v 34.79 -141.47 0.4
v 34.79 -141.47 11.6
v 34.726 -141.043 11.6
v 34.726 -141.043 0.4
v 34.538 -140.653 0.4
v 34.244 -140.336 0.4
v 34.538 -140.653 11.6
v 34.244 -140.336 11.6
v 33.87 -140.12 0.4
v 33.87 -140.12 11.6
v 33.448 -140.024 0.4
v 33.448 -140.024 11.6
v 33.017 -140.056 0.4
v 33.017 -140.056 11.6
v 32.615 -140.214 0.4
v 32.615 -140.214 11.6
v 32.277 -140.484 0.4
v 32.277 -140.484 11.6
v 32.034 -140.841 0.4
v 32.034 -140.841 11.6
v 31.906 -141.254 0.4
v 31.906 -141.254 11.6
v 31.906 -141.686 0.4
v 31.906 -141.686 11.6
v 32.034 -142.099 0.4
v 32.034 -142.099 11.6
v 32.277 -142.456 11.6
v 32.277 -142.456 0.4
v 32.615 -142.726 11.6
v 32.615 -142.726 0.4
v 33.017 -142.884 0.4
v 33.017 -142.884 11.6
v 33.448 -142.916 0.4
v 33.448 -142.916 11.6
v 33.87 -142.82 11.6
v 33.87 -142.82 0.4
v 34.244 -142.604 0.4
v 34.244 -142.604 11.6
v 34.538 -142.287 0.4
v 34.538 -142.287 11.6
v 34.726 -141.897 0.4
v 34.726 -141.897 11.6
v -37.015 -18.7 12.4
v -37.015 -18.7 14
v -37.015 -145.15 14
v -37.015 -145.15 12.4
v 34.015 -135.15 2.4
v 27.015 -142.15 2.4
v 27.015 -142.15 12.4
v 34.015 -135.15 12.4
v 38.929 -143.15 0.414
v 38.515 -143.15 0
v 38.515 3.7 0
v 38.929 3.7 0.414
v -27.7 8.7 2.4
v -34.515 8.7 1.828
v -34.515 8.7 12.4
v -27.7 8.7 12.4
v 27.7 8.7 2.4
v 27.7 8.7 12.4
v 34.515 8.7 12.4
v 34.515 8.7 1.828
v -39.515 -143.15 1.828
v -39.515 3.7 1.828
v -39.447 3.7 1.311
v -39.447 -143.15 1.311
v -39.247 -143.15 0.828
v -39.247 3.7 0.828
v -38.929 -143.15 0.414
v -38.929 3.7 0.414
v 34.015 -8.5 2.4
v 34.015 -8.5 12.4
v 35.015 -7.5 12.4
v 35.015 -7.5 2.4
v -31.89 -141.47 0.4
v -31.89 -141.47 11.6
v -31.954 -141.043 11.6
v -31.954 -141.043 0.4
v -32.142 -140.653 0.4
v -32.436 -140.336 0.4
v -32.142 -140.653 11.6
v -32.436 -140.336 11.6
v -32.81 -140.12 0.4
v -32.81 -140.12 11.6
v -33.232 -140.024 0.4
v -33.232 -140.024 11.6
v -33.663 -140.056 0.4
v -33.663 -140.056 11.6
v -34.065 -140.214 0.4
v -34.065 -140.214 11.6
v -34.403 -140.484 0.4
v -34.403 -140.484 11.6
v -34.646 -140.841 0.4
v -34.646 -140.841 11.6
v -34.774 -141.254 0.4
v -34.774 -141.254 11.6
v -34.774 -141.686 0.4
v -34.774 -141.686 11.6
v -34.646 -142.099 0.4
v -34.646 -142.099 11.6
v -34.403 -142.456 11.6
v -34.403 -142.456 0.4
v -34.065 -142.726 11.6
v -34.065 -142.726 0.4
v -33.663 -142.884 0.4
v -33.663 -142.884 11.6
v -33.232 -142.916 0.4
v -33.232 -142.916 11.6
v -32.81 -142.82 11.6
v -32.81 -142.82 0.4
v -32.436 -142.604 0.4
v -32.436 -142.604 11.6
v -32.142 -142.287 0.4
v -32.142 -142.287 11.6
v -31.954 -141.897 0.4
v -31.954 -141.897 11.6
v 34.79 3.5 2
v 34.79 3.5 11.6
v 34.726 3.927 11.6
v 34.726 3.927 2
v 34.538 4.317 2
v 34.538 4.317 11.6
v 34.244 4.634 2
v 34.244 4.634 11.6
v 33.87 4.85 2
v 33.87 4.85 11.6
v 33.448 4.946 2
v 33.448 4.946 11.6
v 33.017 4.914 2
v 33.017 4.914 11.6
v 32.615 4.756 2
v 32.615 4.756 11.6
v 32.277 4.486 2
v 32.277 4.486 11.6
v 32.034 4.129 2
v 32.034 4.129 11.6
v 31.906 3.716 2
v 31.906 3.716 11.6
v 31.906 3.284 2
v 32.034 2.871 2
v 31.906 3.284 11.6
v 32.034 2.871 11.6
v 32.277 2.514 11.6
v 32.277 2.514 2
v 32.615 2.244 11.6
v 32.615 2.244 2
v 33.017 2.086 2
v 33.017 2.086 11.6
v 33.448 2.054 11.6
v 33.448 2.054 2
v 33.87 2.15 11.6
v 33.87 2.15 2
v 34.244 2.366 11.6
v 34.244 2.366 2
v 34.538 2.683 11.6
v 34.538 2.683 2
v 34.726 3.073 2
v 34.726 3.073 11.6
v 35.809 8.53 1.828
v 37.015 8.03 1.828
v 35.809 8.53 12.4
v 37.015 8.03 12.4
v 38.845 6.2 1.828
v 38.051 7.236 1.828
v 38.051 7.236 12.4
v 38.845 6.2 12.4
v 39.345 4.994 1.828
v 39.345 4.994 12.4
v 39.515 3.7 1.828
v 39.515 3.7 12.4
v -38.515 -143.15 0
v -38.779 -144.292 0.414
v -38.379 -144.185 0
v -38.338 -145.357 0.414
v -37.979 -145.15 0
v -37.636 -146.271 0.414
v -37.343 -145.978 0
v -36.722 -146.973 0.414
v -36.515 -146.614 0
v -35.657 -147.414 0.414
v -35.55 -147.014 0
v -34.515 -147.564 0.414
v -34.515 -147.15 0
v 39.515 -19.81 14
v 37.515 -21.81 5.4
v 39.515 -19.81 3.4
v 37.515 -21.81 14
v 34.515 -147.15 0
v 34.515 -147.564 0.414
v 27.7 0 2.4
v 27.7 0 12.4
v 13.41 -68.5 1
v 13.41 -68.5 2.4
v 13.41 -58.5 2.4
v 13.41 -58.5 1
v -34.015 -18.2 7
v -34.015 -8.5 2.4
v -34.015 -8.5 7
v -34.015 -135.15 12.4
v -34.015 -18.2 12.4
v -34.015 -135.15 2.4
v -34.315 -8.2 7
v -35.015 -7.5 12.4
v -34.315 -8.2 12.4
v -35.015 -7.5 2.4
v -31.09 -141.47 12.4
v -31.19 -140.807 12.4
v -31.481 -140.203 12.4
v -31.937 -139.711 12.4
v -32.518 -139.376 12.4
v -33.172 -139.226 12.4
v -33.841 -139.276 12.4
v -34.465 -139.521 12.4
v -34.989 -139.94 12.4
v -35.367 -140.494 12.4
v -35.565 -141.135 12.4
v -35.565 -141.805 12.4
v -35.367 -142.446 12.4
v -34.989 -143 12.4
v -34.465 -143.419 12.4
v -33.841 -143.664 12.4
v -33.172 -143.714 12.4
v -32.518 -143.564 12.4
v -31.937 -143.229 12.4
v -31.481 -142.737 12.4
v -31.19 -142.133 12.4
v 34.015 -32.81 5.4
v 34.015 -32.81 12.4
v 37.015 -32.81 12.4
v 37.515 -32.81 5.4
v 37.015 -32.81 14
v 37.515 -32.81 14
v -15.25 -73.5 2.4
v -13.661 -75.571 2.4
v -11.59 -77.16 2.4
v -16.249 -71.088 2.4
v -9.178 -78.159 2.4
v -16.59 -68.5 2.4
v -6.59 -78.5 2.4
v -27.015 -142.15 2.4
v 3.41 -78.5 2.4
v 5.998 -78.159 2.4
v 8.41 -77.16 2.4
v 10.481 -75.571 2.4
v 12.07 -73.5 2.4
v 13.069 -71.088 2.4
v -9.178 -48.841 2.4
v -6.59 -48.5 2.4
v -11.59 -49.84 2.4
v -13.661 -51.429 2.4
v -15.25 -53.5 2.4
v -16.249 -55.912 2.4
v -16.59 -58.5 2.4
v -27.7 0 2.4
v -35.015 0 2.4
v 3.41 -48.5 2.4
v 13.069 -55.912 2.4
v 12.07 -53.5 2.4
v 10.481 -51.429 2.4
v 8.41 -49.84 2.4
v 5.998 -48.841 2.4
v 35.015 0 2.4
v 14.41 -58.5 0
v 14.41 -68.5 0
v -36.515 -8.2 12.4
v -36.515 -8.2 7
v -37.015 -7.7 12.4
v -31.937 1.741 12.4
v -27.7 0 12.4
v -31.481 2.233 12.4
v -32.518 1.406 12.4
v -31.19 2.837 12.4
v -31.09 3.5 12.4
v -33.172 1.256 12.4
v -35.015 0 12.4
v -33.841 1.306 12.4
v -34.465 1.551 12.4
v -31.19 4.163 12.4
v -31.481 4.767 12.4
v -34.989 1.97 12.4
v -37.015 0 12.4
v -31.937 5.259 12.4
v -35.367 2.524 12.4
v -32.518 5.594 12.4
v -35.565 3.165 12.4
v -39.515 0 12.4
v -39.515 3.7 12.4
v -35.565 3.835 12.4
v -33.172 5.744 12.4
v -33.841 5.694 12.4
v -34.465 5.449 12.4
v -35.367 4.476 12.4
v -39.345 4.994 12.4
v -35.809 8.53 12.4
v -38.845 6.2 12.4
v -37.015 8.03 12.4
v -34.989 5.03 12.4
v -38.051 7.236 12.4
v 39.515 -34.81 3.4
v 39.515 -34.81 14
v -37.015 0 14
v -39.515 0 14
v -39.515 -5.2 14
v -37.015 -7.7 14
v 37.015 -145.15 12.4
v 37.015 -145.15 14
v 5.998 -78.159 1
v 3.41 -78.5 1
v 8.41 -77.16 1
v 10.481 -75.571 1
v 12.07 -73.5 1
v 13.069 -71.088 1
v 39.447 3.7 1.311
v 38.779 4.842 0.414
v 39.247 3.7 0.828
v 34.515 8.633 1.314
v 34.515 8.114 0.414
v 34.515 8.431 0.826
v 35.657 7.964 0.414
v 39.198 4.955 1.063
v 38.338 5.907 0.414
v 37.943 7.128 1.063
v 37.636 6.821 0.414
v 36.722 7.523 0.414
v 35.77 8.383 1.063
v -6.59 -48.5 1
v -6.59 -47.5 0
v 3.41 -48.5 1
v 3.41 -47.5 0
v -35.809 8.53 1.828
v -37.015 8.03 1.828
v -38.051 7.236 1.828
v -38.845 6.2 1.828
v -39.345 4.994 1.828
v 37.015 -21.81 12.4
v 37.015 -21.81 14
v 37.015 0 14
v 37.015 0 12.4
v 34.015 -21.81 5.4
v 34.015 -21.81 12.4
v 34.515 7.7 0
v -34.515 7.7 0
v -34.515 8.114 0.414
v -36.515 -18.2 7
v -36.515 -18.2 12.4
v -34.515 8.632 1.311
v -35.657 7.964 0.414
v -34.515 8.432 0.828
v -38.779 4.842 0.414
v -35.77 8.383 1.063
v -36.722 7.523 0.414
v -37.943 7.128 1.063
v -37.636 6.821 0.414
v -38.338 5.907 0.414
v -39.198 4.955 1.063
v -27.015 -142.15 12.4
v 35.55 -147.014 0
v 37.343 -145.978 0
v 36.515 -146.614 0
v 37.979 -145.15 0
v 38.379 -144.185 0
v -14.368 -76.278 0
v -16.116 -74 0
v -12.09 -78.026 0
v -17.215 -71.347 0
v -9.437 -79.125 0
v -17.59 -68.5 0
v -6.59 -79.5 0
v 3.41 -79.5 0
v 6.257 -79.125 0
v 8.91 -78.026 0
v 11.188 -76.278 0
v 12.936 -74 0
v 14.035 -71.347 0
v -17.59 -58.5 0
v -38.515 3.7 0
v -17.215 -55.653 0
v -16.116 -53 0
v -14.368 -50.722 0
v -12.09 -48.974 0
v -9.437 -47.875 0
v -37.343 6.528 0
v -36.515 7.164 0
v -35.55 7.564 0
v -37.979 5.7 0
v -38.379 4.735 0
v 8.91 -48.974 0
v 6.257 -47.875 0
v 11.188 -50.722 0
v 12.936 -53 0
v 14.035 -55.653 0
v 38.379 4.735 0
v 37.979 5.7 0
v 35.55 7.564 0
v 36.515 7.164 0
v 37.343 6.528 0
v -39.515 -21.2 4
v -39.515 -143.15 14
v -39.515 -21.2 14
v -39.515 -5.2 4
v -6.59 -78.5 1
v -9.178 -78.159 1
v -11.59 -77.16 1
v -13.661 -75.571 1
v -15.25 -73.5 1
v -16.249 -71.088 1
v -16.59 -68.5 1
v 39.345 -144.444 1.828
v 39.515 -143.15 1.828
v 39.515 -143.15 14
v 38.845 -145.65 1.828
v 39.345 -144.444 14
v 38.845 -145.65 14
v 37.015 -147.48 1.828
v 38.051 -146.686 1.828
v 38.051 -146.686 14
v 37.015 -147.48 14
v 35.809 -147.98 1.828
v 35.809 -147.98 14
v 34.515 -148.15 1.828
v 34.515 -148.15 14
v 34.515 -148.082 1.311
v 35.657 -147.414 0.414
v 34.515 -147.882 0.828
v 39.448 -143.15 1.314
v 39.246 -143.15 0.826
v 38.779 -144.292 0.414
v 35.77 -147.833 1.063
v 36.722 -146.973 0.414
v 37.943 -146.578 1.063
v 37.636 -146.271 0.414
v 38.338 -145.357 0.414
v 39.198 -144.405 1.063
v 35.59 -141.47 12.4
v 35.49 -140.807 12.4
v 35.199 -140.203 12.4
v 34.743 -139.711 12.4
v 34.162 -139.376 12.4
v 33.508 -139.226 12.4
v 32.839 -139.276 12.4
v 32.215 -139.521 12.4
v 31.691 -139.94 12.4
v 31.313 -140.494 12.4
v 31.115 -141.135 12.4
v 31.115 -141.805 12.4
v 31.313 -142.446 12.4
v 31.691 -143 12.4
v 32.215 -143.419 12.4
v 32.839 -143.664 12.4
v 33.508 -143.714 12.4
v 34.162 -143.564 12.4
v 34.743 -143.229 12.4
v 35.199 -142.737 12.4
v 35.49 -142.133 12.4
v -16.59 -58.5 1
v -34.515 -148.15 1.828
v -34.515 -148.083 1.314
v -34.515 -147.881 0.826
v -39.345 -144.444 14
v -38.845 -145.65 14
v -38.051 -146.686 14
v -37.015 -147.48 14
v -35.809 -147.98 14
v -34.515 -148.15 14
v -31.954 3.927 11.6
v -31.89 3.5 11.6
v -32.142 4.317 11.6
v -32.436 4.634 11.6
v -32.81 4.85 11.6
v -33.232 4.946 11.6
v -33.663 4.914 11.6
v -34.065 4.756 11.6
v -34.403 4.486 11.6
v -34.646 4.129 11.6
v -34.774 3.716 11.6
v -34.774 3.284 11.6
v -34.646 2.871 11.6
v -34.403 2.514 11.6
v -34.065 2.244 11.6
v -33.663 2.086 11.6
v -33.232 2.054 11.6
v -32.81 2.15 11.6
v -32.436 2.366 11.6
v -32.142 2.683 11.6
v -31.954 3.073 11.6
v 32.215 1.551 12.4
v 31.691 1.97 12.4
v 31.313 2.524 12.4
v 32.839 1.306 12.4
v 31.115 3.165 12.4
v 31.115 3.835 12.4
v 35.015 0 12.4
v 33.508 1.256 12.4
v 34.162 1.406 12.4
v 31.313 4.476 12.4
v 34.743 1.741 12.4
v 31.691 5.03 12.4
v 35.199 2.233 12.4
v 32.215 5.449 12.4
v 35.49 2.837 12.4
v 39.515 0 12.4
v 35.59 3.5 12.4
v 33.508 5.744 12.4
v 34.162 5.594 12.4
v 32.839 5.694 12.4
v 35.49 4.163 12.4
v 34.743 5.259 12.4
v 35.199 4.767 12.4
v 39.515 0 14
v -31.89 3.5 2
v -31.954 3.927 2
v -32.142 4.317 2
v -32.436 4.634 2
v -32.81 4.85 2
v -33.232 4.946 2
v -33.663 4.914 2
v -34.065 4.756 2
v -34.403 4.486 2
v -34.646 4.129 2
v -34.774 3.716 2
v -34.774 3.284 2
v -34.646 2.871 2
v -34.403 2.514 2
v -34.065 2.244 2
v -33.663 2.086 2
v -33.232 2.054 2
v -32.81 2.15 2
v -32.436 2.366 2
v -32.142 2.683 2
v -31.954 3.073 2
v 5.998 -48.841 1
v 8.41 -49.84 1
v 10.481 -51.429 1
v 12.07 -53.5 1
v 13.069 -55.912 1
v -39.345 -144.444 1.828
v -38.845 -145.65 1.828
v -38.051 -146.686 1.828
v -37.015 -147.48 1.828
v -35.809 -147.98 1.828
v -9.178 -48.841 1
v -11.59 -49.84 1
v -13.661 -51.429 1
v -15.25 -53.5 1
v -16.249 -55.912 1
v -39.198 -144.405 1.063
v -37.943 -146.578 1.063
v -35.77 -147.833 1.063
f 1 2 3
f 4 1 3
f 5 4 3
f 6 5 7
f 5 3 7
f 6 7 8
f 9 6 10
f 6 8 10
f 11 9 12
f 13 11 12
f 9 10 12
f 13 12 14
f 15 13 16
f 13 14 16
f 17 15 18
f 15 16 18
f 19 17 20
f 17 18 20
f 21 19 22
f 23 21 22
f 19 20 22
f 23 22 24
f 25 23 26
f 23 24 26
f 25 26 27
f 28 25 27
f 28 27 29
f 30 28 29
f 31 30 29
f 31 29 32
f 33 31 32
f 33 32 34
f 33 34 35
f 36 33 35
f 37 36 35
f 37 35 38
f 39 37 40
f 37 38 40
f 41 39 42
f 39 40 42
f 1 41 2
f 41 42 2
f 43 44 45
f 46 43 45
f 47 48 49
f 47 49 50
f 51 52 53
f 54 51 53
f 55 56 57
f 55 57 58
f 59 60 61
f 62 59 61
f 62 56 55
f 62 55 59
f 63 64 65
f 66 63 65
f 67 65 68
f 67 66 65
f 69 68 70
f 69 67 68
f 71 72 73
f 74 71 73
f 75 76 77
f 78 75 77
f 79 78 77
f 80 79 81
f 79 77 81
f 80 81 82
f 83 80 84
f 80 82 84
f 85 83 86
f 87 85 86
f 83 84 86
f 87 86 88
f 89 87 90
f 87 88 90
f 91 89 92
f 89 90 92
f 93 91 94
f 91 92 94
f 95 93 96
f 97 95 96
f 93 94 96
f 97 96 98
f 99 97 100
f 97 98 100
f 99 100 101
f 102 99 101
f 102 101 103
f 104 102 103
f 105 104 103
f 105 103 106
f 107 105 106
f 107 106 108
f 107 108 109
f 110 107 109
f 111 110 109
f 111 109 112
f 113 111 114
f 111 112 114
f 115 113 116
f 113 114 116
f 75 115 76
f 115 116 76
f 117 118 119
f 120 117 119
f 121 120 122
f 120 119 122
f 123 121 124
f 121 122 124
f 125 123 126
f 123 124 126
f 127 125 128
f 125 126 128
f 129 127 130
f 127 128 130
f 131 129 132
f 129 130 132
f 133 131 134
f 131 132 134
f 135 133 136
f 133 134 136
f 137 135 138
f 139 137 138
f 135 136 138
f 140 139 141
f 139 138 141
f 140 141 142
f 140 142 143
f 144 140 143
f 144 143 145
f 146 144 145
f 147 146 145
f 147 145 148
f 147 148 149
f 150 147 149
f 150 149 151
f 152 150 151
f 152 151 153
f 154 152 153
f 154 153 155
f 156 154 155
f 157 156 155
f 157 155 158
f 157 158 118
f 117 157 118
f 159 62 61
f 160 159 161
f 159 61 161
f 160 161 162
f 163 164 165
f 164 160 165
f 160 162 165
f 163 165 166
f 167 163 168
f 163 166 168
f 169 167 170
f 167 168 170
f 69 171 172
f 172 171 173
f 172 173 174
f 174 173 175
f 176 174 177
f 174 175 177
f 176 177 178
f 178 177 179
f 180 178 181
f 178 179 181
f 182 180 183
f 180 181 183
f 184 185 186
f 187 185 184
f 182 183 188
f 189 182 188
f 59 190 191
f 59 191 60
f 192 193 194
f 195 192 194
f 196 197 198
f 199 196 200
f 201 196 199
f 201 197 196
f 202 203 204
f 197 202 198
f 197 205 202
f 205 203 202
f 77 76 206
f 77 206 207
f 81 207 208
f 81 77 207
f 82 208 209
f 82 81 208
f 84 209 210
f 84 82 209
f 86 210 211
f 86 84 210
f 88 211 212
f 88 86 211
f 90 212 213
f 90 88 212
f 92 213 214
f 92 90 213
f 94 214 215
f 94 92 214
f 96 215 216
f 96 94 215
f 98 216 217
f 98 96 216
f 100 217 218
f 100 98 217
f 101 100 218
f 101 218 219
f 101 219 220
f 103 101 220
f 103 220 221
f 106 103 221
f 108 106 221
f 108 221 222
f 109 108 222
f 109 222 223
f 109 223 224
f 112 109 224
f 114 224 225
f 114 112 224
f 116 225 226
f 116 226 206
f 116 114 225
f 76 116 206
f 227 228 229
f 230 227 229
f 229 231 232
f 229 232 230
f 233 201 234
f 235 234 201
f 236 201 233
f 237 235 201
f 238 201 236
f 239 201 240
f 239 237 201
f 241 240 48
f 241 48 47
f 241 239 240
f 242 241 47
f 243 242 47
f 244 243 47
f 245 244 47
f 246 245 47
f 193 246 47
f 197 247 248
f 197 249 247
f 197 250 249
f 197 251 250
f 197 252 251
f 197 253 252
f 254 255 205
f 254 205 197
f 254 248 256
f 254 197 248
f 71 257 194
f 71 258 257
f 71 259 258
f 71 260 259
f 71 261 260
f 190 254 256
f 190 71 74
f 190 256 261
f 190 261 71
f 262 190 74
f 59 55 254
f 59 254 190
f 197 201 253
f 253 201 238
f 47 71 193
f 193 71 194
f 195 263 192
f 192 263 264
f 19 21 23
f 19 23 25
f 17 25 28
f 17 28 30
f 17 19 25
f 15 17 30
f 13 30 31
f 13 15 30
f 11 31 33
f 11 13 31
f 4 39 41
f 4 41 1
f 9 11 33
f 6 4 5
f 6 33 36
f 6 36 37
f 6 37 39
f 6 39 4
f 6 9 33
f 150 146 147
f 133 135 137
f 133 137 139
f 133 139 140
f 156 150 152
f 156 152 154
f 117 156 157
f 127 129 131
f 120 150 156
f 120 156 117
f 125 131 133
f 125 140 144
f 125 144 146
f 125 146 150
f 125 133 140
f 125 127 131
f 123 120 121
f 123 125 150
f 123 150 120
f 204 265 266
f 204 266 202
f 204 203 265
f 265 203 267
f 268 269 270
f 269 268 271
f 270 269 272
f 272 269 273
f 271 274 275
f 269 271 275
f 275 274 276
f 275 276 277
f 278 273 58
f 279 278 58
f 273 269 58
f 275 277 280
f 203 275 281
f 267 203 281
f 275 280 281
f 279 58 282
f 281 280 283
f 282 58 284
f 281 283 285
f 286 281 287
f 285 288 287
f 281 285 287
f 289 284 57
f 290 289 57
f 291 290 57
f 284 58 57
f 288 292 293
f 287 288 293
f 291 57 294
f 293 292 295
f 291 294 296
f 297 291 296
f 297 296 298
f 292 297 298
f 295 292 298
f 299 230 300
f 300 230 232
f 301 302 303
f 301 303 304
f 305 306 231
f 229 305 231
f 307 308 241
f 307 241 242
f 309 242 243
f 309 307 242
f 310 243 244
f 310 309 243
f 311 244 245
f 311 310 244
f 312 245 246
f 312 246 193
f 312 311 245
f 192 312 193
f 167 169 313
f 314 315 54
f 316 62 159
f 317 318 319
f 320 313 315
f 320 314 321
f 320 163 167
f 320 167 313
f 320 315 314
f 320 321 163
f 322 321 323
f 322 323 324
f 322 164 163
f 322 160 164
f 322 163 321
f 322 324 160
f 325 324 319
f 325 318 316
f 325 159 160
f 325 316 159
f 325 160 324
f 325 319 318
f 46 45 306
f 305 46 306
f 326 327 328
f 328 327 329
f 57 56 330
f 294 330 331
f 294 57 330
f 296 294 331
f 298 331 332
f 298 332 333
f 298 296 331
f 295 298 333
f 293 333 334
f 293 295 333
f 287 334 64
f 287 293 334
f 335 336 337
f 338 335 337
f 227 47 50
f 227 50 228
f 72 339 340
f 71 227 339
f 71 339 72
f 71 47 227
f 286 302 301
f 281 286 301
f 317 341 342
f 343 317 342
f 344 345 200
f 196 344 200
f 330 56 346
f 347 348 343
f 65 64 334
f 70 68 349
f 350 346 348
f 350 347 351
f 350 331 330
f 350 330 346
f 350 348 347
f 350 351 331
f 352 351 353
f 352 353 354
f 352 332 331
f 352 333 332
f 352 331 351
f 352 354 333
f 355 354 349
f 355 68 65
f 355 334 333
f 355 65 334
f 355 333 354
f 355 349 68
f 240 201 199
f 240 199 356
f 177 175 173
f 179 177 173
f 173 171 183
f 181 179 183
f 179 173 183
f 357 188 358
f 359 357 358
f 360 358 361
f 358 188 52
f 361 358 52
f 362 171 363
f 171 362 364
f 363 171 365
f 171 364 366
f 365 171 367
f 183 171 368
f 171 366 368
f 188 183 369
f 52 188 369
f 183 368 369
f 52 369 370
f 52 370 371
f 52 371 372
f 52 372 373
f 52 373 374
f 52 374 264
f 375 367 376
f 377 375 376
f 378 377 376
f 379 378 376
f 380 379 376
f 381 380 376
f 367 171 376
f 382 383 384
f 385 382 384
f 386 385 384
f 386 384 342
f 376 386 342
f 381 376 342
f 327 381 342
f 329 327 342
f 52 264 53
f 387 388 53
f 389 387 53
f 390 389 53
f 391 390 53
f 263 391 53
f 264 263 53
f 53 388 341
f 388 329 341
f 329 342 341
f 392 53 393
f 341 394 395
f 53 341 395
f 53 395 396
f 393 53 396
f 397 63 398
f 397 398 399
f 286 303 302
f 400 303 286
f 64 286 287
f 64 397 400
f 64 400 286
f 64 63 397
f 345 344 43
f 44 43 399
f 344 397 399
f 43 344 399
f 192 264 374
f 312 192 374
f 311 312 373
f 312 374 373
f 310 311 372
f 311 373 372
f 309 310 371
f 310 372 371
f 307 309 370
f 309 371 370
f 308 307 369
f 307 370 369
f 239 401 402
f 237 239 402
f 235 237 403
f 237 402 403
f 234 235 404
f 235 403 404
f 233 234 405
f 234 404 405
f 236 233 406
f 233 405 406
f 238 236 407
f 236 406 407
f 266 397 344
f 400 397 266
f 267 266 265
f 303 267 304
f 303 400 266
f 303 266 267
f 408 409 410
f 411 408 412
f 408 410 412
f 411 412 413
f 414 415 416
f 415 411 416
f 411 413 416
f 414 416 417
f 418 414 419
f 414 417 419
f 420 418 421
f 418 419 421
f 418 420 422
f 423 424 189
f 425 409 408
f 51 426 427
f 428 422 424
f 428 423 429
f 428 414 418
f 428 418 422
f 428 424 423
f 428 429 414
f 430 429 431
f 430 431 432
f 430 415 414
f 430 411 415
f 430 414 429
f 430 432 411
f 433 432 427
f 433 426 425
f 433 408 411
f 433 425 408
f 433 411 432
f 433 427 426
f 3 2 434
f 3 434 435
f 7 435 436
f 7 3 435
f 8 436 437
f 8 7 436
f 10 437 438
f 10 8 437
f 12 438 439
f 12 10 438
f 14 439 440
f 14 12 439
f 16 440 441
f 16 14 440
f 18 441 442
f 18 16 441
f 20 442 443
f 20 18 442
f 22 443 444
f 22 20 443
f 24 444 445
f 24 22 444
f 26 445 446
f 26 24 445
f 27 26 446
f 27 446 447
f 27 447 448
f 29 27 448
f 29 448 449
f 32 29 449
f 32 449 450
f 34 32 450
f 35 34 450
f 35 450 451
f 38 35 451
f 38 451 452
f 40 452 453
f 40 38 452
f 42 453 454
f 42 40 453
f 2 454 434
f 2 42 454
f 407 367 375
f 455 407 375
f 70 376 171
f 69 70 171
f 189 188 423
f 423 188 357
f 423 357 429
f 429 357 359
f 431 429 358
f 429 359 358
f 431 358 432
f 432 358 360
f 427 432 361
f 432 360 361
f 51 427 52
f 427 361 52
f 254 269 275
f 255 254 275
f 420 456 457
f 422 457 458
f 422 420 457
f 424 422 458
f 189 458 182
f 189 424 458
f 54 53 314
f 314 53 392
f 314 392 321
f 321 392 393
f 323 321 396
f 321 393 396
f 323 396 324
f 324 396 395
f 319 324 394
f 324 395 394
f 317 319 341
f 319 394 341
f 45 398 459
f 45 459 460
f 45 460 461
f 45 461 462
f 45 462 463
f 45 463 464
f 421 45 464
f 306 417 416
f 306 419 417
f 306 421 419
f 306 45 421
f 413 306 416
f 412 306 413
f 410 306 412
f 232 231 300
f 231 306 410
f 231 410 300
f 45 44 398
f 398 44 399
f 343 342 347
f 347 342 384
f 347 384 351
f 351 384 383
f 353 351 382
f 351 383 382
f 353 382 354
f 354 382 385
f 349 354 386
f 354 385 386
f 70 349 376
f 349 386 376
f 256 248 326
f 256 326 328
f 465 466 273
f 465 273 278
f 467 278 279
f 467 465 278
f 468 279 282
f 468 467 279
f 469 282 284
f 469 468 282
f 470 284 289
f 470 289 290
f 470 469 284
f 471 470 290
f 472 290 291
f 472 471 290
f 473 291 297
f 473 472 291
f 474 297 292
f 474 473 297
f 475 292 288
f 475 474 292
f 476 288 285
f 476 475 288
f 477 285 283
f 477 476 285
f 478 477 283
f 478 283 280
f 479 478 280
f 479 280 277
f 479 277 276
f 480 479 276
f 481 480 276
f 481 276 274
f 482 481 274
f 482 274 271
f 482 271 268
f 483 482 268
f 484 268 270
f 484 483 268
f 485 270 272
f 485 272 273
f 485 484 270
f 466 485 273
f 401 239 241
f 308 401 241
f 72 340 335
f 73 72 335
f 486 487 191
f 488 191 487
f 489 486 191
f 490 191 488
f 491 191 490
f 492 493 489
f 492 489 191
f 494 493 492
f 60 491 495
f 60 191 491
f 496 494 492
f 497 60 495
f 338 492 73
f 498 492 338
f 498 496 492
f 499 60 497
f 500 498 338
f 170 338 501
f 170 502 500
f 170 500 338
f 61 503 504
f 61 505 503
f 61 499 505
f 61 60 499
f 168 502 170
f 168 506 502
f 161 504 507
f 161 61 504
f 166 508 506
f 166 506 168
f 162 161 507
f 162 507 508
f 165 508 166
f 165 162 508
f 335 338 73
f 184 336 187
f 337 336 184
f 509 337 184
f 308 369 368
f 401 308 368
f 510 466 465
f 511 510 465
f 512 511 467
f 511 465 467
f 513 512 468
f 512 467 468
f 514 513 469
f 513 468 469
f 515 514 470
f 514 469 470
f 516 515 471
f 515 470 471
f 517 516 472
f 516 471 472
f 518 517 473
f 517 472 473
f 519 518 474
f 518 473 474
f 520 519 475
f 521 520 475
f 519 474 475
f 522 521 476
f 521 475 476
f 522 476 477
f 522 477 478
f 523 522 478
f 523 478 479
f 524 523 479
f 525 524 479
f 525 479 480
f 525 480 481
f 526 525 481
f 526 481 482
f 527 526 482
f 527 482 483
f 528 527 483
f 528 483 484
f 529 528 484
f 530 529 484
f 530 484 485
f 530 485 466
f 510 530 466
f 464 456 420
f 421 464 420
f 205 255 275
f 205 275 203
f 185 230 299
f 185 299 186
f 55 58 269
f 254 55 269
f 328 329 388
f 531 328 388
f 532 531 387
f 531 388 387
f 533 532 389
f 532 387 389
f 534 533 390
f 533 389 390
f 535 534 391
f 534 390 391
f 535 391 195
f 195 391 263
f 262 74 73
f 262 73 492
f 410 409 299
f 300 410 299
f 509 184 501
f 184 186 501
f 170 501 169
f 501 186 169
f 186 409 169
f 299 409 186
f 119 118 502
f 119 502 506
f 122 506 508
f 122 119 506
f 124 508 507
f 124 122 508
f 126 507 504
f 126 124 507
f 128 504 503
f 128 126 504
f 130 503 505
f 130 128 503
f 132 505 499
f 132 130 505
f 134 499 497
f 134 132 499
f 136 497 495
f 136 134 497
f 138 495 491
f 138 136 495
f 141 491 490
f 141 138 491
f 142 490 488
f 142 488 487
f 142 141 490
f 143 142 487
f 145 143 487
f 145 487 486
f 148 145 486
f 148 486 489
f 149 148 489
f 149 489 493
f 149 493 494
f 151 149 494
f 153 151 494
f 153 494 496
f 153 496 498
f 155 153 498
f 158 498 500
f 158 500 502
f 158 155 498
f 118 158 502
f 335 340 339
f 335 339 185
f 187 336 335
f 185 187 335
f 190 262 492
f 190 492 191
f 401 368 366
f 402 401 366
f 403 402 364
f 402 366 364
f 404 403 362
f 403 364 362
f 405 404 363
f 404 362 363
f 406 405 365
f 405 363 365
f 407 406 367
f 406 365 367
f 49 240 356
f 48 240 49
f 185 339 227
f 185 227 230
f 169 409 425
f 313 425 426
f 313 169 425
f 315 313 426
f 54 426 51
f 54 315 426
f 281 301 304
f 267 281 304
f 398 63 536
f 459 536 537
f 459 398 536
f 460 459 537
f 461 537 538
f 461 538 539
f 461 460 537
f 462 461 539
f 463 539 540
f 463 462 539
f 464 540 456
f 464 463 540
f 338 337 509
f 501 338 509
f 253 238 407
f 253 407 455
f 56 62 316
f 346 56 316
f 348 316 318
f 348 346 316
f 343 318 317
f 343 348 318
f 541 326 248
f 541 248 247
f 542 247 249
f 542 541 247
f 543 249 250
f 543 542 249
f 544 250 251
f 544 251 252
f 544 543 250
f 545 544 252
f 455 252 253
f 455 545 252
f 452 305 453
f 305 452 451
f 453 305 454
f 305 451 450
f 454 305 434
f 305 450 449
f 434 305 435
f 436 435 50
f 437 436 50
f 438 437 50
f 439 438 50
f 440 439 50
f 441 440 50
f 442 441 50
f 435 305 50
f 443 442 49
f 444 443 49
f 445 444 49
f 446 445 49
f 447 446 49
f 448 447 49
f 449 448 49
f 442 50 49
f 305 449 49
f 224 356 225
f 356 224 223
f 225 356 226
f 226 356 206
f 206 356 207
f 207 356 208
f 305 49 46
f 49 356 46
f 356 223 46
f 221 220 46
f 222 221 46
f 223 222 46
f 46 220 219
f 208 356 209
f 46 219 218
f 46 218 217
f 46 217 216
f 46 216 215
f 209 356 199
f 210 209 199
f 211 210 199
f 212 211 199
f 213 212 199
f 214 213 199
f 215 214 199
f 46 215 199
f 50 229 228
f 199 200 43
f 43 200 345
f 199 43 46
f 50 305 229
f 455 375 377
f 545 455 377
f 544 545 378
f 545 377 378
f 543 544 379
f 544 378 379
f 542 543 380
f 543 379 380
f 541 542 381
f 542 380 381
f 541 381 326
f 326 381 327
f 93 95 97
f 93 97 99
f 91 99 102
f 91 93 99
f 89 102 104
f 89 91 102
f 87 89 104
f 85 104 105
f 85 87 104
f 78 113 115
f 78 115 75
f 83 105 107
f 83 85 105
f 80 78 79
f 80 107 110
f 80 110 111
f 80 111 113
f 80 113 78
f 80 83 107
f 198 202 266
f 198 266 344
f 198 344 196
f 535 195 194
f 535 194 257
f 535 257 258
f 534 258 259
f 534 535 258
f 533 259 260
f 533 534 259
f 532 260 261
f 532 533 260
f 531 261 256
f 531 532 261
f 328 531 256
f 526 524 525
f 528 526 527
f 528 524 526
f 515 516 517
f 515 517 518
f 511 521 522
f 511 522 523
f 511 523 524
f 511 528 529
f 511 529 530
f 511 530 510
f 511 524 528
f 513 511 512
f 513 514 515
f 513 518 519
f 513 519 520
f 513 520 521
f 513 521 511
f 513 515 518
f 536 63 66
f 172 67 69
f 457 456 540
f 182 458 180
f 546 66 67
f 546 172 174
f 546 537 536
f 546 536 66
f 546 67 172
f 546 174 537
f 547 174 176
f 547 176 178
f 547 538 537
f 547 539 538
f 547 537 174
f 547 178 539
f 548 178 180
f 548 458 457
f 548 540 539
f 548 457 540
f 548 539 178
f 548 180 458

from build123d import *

# Parameters (mm, degrees)
SKETCH_W        = 79.03
SKETCH_H        = 156.85
PAD_DEPTH       = 14
POCKET_DEPTH    = 11.6
PAD001_DEPTH    = 10
SKETCH003_R     = 1.45
POCKET001_DEPTH = 12
FILLET_R        = 5
CHAMFER_SIZE    = 1
FILLET001_R     = 2
CHAMFER001_SIZE = 0.8
SKETCH004_W     = 12.65
SKETCH004_H     = 11
POCKET002_DEPTH = 8.6
SKETCH005_W     = 11.08
SKETCH005_H     = 10
POCKET003_DEPTH = 7
SKETCH006_R     = 1.45
POCKET004_DEPTH = 12
SKETCH007_W     = 92.15
SKETCH007_H     = 16.7
POCKET005_DEPTH = 1.6
CHAMFER002_SIZE = 0.8
SKETCH008_W     = 30
SKETCH008_H     = 30
POCKET006_DEPTH = 2.401
FILLET002_R     = 10
CHAMFER003_SIZE = 1
CHAMFER004_SIZE = 3
CHAMFER005_SIZE = 2


with BuildPart() as part:
    # Sketch → Pad (new body)
    with BuildSketch(Plane.XY):
        with Locations((0, -69.725)):
            Rectangle(SKETCH_W, SKETCH_H)
    extrude(amount=PAD_DEPTH)

    # Sketch001 (on Face6 of Pad) → Pocket (cut)
    with BuildSketch(Plane.XY.offset(14)):
        Polygon((-37.015, -145.15), (37.015, -145.15), (37.015, 0), (27.7, 0), (27.7, 8.7), (-27.7, 8.7), (-27.7, 0), (-37.015, 0), align=None)
    extrude(amount=-POCKET_DEPTH, mode=Mode.SUBTRACT)

    # Sketch002 (on Face6 of Pocket) → Pad001 (join)
    with BuildSketch(Plane.XY.offset(2.4)):
        Polygon((-35.015, 0), (-35.015, -7.5), (-34.015, -8.5), (-34.015, -135.15), (-27.015, -142.15), (27.015, -142.15), (34.015, -135.15), (34.015, -8.5), (35.015, -7.5), (35.015, 0), (37.015, 0), (37.015, -145.15), (-37.015, -145.15), (-37.015, 0), align=None)
    extrude(amount=PAD001_DEPTH)

    # Sketch003 (on Face24 of Pad001) → Pocket001 (cut)
    with BuildSketch(Plane.XY.offset(12.4)):
        with Locations((-33.34, -141.47)):
            Circle(SKETCH003_R)
        with Locations((33.34, -141.47)):
            Circle(SKETCH003_R)
    extrude(amount=-POCKET001_DEPTH, mode=Mode.SUBTRACT)

    # Fillet
    fillet_edges = [part.edges().sort_by_distance(p)[0] for p in [
        (39.515, 8.7, 7),
        (39.515, -148.15, 7),
        (-39.515, 8.7, 7),
        (-39.515, -148.15, 7),
    ]]
    fillet(fillet_edges, radius=FILLET_R)

    # Chamfer
    chamfer_edges = [part.edges().sort_by_distance(p)[0] for p in [
        (-38.050534, 7.235534, 0),
    ]]
    chamfer(chamfer_edges, length=CHAMFER_SIZE)

    # Fillet001
    fillet001_edges = [part.edges().sort_by_distance(p)[0] for p in [
        (-38.050534, 7.235534, 1),
    ]]
    fillet(fillet001_edges, radius=FILLET001_R)

    # Chamfer001
    chamfer001_edges = [part.edges().sort_by_distance(p)[0] for p in [
        (-34.79, -141.47, 12.4),
        (31.89, -141.47, 12.4),
    ]]
    chamfer(chamfer001_edges, length=CHAMFER001_SIZE)

    # Sketch004 (on Face20 of Chamfer001) → Pocket002 (cut)
    with BuildSketch(Plane.XY.offset(14)):
        with Locations((37.485, -27.31)):
            Rectangle(SKETCH004_W, SKETCH004_H)
    extrude(amount=-POCKET002_DEPTH, mode=Mode.SUBTRACT)

    # Sketch005 (on Face16 of Pocket002) → Pocket003 (cut)
    with BuildSketch(Plane.XY.offset(14)):
        with Locations((-36.33, -13.2)):
            Rectangle(SKETCH005_W, SKETCH005_H)
    extrude(amount=-POCKET003_DEPTH, mode=Mode.SUBTRACT)

    # Sketch006 → Pocket004 (cut)
    with BuildSketch(Plane.XY.offset(14)):
        with Locations((-33.34, 3.5)):
            Circle(SKETCH006_R)
        with Locations((33.34, 3.5)):
            Circle(SKETCH006_R)
    extrude(amount=-POCKET004_DEPTH, mode=Mode.SUBTRACT)

    # Sketch007 (on Face7 of Pocket004) → Pocket005 (cut)
    with BuildSketch(Plane.XY.offset(14)):
        with Locations((0, 8.35)):
            Rectangle(SKETCH007_W, SKETCH007_H)
    extrude(amount=-POCKET005_DEPTH, mode=Mode.SUBTRACT)

    # Chamfer002
    chamfer002_edges = [part.edges().sort_by_distance(p)[0] for p in [
        (31.89, 3.5, 12.4),
        (-34.79, 3.5, 12.4),
    ]]
    chamfer(chamfer002_edges, length=CHAMFER002_SIZE)

    # Sketch008 (on Face16 of Chamfer002) → Pocket006 (cut, through all)
    with BuildSketch(Plane.XY.offset(2.4)):
        with Locations((-1.59, -63.5)):
            Rectangle(SKETCH008_W, SKETCH008_H)
    extrude(amount=-POCKET006_DEPTH, mode=Mode.SUBTRACT)

    # Fillet002
    fillet002_edges = [part.edges().sort_by_distance(p)[0] for p in [
        (-16.59, -48.5, 1.2),
        (13.41, -48.5, 1.2),
        (13.41, -78.5, 1.2),
        (-16.59, -78.5, 1.2),
    ]]
    fillet(fillet002_edges, radius=FILLET002_R)

    # Chamfer003
    chamfer003_edges = [part.edges().sort_by_distance(p)[0] for p in [
        (-13.661068, -75.571068, 0),
    ]]
    chamfer(chamfer003_edges, length=CHAMFER003_SIZE)

    # Chamfer004
    chamfer004_edges = [part.edges().sort_by_distance(p)[0] for p in [
        (-39.515, -18.2, 10.5),
        (-39.515, -13.2, 7),
        (-39.515, -8.2, 10.5),
    ]]
    chamfer(chamfer004_edges, length=CHAMFER004_SIZE)

    # Chamfer005
    chamfer005_edges = [part.edges().sort_by_distance(p)[0] for p in [
        (39.515, -32.81, 9.7),
        (39.515, -27.31, 5.4),
        (39.515, -21.81, 9.7),
    ]]
    chamfer(chamfer005_edges, length=CHAMFER005_SIZE)


solid = part.part
